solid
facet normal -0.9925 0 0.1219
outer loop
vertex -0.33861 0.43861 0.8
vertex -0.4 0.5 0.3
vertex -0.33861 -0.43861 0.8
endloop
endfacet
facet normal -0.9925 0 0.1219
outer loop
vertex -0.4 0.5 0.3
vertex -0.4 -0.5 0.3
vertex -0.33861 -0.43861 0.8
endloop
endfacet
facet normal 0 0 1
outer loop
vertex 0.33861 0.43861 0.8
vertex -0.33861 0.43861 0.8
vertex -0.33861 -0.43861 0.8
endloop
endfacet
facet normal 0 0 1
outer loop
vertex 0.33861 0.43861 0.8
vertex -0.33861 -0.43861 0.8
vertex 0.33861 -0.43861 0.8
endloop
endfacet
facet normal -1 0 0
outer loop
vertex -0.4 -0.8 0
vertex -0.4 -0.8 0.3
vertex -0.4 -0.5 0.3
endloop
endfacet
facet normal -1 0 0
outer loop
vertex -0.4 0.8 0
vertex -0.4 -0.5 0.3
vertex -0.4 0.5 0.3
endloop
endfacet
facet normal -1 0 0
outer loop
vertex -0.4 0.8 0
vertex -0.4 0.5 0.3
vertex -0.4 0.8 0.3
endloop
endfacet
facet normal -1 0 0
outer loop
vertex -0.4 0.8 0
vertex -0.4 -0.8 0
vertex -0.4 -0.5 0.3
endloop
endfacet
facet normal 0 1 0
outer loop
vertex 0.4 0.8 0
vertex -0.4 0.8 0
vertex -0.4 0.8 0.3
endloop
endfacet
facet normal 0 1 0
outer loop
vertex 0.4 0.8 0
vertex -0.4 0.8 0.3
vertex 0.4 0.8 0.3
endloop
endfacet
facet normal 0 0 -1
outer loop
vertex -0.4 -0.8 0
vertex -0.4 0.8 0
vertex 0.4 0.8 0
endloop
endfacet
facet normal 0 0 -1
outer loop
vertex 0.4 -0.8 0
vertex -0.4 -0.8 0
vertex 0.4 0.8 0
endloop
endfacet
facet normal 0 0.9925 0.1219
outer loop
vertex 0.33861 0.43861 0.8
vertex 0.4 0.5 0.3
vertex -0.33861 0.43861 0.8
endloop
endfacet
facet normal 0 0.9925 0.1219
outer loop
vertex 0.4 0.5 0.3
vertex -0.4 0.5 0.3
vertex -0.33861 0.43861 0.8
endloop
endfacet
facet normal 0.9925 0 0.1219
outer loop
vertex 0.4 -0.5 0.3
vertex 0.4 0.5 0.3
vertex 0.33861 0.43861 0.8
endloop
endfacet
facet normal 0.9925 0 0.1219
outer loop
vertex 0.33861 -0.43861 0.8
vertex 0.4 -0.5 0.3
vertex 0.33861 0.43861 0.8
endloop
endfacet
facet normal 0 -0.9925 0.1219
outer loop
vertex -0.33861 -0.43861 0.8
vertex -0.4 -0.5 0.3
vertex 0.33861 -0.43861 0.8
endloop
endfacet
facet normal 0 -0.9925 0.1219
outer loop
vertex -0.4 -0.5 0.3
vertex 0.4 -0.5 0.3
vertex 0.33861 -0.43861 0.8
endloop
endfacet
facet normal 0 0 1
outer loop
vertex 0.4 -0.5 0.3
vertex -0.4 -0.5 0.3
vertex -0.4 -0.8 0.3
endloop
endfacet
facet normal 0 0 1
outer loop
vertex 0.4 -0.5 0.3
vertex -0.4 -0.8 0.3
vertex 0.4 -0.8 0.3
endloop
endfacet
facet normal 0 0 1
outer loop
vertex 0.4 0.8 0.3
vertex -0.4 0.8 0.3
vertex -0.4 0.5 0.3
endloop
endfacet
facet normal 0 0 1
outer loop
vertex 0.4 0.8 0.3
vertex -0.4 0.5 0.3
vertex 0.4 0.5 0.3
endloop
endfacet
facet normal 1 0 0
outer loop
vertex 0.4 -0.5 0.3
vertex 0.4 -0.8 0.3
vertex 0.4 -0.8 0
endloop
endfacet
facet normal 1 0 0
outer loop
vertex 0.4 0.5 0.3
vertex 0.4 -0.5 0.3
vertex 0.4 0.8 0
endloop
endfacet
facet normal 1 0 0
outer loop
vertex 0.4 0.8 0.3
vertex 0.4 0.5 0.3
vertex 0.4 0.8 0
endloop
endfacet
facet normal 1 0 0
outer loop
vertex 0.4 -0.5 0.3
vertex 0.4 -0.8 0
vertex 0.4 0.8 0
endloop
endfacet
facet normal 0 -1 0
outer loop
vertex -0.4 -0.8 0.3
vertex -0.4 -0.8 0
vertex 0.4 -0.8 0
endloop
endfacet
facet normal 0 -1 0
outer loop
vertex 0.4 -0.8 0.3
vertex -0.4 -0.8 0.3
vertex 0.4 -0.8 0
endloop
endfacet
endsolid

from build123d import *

# Parameters (mm, degrees)
SKETCH1_W           = 0.8
SKETCH1_H           = 1.6
BOSS_EXTRUDE1_DEPTH = 0.3
SKETCH3_W           = 0.8
SKETCH3_H           = 1
BOSS_EXTRUDE3_DEPTH = 0.5
BOSS_EXTRUDE3_TAPER = 7


with BuildPart() as part:
    # Sketch1 → Boss-Extrude1 (new body)
    with BuildSketch(Plane.XY):
        Rectangle(SKETCH1_W, SKETCH1_H)
    extrude(amount=BOSS_EXTRUDE1_DEPTH)

    # Sketch3 → Boss-Extrude3 (add)
    with BuildSketch(Plane.XY.offset(0.3)):
        Rectangle(SKETCH3_W, SKETCH3_H)
    extrude(amount=BOSS_EXTRUDE3_DEPTH, taper=BOSS_EXTRUDE3_TAPER)


solid = part.part
